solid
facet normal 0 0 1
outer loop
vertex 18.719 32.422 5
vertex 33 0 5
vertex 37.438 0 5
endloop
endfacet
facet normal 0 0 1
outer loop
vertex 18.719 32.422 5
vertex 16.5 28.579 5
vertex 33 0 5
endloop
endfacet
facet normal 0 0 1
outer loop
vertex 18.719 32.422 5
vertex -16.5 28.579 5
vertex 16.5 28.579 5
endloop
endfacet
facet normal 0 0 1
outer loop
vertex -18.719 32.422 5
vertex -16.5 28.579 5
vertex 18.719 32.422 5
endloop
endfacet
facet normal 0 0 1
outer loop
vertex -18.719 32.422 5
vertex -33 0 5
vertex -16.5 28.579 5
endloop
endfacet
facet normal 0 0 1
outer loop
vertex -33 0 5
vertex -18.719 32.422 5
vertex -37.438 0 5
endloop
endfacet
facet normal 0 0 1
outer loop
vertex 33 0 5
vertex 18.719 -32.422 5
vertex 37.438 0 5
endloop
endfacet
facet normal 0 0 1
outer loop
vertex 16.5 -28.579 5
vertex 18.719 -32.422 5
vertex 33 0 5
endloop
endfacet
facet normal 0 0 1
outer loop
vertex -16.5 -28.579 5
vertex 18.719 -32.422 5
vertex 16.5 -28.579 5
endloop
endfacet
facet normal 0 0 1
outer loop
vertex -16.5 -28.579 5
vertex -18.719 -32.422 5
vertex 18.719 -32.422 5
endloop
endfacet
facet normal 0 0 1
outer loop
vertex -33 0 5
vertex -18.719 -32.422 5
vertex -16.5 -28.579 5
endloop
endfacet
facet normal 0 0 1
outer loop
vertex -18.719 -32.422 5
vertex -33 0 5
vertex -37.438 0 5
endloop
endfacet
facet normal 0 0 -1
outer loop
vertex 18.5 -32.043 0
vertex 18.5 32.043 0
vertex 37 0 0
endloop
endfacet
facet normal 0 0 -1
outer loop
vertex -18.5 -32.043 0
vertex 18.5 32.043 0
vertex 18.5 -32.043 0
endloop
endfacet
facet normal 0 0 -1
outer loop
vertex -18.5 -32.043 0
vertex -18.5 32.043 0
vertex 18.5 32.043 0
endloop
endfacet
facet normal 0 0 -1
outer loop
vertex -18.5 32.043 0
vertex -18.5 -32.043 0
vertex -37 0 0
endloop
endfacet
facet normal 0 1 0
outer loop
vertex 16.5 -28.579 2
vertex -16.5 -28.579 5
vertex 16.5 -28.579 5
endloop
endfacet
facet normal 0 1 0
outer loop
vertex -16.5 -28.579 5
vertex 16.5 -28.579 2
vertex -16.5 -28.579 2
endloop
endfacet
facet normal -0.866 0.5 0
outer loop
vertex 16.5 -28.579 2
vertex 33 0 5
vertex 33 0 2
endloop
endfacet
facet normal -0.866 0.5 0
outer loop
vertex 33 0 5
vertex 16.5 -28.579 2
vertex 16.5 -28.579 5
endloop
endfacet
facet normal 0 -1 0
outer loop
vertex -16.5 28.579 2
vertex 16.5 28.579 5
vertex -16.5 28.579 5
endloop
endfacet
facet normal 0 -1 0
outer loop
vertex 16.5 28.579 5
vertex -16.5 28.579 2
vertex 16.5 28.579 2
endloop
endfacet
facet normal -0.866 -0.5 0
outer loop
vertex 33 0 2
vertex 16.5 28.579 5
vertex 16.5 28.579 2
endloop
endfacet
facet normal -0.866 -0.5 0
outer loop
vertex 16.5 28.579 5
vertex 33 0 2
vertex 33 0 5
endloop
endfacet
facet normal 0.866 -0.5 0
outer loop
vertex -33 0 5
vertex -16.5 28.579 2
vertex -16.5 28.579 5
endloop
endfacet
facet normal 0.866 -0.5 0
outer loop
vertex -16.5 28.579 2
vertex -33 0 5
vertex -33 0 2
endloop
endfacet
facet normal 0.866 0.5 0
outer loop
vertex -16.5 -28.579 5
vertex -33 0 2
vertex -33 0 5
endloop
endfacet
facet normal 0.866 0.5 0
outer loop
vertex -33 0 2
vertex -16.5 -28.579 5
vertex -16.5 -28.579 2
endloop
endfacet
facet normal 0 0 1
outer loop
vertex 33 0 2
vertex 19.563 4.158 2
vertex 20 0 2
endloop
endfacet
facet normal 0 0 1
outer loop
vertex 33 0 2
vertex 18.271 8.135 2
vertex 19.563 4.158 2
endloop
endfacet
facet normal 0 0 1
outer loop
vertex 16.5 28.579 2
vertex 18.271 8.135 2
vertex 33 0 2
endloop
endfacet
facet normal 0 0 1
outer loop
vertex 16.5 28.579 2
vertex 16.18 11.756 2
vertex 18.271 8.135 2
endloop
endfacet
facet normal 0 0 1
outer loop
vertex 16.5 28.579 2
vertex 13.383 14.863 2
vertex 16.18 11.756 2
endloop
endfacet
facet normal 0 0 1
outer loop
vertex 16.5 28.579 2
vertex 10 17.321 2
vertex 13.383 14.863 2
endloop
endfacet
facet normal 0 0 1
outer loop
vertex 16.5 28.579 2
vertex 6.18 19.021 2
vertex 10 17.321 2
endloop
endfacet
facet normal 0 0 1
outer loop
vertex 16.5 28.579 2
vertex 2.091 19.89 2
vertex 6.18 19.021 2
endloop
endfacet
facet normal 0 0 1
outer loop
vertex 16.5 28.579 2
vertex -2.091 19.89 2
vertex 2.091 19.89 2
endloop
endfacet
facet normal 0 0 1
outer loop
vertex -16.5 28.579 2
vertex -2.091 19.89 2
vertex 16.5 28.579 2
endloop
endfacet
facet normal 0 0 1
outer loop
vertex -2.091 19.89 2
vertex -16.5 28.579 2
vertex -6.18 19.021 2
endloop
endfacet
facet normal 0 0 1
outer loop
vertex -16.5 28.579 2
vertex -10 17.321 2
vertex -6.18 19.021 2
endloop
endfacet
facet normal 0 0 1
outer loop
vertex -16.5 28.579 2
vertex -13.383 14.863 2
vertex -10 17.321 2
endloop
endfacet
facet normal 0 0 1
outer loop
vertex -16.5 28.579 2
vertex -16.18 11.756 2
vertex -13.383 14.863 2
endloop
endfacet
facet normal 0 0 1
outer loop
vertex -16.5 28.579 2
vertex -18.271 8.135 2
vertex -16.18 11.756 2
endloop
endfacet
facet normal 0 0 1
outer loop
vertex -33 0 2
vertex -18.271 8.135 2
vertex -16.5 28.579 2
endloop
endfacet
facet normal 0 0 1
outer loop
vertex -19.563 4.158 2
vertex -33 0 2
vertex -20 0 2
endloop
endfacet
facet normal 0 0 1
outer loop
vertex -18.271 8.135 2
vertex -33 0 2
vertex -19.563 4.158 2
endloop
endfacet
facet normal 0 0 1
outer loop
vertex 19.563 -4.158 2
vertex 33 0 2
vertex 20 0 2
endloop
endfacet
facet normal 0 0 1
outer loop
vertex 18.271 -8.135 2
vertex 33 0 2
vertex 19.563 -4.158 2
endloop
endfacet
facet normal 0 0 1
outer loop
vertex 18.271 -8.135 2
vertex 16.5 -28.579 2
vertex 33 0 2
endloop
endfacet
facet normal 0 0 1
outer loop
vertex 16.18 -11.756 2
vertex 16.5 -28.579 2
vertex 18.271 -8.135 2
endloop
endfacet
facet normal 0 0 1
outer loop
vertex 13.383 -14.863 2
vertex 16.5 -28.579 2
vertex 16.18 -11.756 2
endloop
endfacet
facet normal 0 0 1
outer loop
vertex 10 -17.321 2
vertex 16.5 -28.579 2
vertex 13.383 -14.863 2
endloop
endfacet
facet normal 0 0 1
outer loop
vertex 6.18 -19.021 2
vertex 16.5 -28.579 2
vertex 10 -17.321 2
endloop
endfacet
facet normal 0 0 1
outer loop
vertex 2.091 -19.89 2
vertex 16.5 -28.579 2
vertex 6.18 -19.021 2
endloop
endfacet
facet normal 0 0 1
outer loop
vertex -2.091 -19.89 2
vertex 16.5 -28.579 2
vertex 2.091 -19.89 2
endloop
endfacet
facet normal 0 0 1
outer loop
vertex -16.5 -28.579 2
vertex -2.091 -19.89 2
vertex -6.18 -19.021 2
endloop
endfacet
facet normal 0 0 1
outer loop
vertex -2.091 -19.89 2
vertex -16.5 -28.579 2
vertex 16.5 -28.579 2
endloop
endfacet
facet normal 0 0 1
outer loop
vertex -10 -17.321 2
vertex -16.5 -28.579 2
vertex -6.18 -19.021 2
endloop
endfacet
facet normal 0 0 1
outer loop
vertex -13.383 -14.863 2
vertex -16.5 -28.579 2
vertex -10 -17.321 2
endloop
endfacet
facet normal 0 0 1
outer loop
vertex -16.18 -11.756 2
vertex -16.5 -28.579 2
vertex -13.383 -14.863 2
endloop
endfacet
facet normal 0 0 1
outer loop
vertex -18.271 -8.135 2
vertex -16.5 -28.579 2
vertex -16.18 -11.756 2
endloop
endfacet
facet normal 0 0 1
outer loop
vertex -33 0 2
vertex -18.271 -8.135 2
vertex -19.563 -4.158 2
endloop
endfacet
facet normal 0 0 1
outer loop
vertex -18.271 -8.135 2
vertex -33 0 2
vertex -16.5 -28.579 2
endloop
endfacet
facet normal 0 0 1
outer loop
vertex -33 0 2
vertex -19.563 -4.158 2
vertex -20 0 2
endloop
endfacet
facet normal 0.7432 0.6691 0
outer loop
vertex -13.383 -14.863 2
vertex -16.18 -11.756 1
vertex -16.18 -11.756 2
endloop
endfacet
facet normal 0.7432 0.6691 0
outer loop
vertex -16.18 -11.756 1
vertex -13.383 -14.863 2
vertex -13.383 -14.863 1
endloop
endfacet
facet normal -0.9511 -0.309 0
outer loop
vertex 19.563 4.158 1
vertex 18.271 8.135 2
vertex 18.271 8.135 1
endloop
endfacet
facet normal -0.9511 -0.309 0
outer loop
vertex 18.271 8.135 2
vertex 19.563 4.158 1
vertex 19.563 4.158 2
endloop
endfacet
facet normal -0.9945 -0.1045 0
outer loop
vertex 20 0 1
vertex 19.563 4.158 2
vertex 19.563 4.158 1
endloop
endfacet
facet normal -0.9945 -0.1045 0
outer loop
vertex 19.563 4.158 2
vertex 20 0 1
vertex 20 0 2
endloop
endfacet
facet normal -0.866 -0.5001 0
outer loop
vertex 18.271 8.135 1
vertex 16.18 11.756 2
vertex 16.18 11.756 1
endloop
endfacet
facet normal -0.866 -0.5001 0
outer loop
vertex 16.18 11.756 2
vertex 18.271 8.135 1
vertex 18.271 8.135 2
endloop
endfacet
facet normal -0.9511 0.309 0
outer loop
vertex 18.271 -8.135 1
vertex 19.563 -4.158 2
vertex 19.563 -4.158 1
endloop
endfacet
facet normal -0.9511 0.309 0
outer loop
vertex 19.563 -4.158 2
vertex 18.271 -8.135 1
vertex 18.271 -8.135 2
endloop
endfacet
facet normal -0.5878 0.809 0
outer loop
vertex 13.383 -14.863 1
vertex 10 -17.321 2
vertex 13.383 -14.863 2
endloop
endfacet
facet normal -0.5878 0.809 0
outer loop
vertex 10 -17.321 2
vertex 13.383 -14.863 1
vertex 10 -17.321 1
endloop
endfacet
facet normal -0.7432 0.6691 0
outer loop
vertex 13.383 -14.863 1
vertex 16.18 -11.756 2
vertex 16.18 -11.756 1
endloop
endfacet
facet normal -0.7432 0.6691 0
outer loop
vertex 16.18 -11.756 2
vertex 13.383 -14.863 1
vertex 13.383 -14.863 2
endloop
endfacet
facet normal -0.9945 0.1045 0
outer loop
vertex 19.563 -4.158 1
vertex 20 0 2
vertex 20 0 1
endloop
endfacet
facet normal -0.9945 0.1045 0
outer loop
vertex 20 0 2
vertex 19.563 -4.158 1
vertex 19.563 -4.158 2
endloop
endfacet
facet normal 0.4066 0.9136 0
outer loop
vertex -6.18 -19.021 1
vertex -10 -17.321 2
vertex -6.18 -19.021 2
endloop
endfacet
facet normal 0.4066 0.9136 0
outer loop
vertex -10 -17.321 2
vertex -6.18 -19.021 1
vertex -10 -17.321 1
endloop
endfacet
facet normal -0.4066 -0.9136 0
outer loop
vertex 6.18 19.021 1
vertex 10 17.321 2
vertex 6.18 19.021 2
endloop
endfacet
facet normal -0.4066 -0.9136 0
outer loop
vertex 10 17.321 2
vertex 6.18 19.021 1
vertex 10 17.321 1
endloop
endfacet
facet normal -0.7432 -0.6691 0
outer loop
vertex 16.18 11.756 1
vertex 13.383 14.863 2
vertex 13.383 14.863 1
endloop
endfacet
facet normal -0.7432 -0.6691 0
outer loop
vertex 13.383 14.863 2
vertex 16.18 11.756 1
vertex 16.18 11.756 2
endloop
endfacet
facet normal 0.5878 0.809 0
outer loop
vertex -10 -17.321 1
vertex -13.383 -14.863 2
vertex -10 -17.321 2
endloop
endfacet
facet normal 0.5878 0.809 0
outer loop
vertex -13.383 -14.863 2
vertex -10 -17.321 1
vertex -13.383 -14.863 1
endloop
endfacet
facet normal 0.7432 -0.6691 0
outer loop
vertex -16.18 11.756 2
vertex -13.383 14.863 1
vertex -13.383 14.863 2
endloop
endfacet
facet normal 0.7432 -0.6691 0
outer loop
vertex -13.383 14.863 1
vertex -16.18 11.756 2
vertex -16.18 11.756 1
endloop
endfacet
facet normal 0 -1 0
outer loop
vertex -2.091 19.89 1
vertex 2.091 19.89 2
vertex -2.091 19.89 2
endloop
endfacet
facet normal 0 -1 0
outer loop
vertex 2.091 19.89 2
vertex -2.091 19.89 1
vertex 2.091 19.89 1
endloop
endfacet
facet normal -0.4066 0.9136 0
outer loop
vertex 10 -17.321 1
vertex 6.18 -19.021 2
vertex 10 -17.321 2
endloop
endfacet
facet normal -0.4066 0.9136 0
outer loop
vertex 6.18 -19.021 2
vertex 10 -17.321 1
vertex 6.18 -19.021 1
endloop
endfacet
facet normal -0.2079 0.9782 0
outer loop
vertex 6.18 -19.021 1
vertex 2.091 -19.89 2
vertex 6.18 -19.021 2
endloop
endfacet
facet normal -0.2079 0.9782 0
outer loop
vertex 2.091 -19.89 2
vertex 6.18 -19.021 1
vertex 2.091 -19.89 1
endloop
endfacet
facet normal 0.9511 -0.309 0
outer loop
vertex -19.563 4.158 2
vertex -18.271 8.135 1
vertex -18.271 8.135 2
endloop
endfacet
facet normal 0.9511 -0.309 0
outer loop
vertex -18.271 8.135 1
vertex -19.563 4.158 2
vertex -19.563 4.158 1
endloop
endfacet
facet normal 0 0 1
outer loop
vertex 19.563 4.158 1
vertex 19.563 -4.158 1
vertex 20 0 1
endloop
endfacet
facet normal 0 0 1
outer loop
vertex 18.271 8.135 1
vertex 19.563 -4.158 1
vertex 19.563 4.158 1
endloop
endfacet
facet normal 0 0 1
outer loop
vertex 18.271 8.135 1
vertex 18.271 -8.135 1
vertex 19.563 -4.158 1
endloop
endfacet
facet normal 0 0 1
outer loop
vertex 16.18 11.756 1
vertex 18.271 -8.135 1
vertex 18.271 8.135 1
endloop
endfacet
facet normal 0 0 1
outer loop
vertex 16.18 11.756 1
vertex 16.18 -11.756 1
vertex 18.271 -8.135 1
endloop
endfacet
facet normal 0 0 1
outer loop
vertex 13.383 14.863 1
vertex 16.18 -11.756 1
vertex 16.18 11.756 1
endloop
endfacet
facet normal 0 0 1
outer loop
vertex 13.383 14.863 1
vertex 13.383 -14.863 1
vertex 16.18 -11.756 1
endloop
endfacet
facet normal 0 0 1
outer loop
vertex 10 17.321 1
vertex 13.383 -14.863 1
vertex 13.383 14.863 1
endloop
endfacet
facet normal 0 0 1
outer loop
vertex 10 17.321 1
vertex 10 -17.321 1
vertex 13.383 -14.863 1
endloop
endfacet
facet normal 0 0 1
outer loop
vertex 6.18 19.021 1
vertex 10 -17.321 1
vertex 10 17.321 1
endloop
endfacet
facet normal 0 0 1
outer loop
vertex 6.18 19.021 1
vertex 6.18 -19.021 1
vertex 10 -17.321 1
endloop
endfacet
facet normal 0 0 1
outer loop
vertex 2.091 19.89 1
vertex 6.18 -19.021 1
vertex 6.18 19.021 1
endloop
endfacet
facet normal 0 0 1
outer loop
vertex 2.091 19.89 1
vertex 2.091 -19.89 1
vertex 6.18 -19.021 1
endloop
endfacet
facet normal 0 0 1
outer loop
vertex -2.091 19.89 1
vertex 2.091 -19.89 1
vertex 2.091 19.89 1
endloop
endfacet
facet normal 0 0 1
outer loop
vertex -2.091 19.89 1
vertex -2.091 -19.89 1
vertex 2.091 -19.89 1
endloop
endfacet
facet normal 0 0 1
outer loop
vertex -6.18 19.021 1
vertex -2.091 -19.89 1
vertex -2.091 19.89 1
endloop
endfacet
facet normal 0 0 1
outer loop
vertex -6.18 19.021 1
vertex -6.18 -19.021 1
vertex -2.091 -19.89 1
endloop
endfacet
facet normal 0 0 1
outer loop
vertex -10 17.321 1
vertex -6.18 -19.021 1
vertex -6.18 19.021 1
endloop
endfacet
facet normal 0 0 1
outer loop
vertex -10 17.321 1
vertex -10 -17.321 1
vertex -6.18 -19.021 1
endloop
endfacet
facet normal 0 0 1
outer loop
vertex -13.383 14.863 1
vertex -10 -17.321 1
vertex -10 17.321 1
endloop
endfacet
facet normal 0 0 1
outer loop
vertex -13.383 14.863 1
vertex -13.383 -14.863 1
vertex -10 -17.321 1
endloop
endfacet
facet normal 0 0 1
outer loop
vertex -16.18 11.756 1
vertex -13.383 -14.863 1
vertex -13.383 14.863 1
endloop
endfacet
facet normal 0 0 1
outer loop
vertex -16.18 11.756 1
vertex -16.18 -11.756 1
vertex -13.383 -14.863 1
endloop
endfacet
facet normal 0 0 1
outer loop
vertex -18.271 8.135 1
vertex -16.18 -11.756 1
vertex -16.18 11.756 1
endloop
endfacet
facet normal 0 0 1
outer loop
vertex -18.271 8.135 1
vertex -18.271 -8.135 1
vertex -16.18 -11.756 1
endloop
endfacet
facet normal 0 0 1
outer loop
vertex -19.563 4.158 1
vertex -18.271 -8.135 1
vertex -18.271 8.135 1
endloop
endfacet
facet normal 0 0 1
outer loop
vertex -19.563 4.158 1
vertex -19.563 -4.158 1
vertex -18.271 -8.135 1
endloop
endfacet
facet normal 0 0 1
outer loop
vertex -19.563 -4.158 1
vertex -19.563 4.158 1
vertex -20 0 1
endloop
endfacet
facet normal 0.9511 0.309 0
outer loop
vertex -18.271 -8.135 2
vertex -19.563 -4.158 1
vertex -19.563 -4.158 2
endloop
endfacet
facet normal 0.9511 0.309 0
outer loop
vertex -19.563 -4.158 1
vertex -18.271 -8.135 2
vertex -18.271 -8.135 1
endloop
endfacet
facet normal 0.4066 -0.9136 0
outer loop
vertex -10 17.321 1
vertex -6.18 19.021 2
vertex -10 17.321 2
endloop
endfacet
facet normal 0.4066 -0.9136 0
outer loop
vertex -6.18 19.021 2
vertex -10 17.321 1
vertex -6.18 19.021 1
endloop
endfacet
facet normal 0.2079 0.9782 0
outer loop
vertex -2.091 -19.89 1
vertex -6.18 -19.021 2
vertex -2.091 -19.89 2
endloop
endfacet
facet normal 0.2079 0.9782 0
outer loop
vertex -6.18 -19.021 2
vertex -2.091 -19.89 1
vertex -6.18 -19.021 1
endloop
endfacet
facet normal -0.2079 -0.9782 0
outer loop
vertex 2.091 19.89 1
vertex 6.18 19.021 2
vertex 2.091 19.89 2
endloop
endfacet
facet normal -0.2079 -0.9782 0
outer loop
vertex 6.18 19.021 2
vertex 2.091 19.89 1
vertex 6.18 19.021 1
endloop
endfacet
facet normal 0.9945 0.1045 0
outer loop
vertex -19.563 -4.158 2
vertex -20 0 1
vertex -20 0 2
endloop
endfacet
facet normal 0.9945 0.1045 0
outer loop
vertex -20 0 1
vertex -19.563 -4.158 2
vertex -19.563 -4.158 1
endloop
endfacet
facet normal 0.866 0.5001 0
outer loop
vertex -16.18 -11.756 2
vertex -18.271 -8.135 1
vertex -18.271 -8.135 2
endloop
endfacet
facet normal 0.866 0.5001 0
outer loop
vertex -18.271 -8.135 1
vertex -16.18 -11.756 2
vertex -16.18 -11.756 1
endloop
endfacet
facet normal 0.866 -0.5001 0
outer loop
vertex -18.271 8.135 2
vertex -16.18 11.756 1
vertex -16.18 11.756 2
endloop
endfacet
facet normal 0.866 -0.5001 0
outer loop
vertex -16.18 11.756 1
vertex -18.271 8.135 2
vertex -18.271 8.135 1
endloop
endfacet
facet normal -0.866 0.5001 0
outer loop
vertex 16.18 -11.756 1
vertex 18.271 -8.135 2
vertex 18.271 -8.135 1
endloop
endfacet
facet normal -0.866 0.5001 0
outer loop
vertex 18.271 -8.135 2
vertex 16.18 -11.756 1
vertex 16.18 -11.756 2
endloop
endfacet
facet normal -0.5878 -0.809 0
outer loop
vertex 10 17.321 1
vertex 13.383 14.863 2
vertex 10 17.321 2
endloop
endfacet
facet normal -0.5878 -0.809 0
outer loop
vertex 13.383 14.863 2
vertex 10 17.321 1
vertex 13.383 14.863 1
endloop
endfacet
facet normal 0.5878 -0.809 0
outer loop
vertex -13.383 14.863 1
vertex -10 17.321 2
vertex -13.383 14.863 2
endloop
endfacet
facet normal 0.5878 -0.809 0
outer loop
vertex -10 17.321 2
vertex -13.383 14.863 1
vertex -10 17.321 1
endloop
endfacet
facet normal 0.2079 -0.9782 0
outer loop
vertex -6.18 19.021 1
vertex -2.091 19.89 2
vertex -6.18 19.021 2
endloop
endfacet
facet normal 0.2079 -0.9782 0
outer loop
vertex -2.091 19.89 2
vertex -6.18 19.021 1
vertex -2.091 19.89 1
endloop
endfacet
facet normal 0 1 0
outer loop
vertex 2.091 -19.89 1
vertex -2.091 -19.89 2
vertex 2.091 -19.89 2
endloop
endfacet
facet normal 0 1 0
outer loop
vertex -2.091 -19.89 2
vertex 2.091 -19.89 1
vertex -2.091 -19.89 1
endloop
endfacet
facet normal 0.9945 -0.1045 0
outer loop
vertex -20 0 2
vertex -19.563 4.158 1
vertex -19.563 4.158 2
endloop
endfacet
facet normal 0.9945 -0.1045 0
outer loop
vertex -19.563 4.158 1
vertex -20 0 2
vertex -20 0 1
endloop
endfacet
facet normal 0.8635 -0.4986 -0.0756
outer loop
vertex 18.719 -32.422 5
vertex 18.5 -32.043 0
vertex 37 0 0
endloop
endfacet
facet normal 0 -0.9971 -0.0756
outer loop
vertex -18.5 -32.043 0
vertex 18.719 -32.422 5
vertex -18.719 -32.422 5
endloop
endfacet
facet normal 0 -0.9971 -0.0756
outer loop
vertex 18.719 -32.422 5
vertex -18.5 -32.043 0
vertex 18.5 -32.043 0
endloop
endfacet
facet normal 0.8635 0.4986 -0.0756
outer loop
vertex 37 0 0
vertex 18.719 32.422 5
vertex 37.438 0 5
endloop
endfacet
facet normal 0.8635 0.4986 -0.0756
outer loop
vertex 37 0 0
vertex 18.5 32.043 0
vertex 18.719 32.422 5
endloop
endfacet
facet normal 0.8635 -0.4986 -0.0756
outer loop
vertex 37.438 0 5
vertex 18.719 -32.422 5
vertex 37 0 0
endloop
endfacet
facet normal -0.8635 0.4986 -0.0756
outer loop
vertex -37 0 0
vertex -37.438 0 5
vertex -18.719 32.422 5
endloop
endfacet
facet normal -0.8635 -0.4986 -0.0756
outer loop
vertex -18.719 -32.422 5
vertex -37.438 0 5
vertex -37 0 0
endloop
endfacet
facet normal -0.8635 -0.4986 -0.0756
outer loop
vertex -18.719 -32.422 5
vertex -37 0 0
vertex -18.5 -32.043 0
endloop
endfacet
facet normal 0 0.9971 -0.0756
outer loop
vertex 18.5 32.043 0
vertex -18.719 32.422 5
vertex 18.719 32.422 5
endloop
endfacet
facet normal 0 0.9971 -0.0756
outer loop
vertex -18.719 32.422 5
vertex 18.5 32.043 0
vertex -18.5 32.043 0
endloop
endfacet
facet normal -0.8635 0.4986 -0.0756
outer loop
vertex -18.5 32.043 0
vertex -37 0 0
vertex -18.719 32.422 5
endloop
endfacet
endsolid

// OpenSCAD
rotate(0,180,0) {
difference() {
        cylinder($fn=6, h=5, r=37);
        translate([0,0,2]) {
            cylinder($fn=6, h=3, r=33);
        }
        translate([0,0,1]){
            cylinder(h=3, r=20);

    }
}
}

difference() {
    
    cylinder($fn=6, h=5, r2=37.4375, r1=37);cylinder($fn=6, h=40, r=37);
    
    
}
